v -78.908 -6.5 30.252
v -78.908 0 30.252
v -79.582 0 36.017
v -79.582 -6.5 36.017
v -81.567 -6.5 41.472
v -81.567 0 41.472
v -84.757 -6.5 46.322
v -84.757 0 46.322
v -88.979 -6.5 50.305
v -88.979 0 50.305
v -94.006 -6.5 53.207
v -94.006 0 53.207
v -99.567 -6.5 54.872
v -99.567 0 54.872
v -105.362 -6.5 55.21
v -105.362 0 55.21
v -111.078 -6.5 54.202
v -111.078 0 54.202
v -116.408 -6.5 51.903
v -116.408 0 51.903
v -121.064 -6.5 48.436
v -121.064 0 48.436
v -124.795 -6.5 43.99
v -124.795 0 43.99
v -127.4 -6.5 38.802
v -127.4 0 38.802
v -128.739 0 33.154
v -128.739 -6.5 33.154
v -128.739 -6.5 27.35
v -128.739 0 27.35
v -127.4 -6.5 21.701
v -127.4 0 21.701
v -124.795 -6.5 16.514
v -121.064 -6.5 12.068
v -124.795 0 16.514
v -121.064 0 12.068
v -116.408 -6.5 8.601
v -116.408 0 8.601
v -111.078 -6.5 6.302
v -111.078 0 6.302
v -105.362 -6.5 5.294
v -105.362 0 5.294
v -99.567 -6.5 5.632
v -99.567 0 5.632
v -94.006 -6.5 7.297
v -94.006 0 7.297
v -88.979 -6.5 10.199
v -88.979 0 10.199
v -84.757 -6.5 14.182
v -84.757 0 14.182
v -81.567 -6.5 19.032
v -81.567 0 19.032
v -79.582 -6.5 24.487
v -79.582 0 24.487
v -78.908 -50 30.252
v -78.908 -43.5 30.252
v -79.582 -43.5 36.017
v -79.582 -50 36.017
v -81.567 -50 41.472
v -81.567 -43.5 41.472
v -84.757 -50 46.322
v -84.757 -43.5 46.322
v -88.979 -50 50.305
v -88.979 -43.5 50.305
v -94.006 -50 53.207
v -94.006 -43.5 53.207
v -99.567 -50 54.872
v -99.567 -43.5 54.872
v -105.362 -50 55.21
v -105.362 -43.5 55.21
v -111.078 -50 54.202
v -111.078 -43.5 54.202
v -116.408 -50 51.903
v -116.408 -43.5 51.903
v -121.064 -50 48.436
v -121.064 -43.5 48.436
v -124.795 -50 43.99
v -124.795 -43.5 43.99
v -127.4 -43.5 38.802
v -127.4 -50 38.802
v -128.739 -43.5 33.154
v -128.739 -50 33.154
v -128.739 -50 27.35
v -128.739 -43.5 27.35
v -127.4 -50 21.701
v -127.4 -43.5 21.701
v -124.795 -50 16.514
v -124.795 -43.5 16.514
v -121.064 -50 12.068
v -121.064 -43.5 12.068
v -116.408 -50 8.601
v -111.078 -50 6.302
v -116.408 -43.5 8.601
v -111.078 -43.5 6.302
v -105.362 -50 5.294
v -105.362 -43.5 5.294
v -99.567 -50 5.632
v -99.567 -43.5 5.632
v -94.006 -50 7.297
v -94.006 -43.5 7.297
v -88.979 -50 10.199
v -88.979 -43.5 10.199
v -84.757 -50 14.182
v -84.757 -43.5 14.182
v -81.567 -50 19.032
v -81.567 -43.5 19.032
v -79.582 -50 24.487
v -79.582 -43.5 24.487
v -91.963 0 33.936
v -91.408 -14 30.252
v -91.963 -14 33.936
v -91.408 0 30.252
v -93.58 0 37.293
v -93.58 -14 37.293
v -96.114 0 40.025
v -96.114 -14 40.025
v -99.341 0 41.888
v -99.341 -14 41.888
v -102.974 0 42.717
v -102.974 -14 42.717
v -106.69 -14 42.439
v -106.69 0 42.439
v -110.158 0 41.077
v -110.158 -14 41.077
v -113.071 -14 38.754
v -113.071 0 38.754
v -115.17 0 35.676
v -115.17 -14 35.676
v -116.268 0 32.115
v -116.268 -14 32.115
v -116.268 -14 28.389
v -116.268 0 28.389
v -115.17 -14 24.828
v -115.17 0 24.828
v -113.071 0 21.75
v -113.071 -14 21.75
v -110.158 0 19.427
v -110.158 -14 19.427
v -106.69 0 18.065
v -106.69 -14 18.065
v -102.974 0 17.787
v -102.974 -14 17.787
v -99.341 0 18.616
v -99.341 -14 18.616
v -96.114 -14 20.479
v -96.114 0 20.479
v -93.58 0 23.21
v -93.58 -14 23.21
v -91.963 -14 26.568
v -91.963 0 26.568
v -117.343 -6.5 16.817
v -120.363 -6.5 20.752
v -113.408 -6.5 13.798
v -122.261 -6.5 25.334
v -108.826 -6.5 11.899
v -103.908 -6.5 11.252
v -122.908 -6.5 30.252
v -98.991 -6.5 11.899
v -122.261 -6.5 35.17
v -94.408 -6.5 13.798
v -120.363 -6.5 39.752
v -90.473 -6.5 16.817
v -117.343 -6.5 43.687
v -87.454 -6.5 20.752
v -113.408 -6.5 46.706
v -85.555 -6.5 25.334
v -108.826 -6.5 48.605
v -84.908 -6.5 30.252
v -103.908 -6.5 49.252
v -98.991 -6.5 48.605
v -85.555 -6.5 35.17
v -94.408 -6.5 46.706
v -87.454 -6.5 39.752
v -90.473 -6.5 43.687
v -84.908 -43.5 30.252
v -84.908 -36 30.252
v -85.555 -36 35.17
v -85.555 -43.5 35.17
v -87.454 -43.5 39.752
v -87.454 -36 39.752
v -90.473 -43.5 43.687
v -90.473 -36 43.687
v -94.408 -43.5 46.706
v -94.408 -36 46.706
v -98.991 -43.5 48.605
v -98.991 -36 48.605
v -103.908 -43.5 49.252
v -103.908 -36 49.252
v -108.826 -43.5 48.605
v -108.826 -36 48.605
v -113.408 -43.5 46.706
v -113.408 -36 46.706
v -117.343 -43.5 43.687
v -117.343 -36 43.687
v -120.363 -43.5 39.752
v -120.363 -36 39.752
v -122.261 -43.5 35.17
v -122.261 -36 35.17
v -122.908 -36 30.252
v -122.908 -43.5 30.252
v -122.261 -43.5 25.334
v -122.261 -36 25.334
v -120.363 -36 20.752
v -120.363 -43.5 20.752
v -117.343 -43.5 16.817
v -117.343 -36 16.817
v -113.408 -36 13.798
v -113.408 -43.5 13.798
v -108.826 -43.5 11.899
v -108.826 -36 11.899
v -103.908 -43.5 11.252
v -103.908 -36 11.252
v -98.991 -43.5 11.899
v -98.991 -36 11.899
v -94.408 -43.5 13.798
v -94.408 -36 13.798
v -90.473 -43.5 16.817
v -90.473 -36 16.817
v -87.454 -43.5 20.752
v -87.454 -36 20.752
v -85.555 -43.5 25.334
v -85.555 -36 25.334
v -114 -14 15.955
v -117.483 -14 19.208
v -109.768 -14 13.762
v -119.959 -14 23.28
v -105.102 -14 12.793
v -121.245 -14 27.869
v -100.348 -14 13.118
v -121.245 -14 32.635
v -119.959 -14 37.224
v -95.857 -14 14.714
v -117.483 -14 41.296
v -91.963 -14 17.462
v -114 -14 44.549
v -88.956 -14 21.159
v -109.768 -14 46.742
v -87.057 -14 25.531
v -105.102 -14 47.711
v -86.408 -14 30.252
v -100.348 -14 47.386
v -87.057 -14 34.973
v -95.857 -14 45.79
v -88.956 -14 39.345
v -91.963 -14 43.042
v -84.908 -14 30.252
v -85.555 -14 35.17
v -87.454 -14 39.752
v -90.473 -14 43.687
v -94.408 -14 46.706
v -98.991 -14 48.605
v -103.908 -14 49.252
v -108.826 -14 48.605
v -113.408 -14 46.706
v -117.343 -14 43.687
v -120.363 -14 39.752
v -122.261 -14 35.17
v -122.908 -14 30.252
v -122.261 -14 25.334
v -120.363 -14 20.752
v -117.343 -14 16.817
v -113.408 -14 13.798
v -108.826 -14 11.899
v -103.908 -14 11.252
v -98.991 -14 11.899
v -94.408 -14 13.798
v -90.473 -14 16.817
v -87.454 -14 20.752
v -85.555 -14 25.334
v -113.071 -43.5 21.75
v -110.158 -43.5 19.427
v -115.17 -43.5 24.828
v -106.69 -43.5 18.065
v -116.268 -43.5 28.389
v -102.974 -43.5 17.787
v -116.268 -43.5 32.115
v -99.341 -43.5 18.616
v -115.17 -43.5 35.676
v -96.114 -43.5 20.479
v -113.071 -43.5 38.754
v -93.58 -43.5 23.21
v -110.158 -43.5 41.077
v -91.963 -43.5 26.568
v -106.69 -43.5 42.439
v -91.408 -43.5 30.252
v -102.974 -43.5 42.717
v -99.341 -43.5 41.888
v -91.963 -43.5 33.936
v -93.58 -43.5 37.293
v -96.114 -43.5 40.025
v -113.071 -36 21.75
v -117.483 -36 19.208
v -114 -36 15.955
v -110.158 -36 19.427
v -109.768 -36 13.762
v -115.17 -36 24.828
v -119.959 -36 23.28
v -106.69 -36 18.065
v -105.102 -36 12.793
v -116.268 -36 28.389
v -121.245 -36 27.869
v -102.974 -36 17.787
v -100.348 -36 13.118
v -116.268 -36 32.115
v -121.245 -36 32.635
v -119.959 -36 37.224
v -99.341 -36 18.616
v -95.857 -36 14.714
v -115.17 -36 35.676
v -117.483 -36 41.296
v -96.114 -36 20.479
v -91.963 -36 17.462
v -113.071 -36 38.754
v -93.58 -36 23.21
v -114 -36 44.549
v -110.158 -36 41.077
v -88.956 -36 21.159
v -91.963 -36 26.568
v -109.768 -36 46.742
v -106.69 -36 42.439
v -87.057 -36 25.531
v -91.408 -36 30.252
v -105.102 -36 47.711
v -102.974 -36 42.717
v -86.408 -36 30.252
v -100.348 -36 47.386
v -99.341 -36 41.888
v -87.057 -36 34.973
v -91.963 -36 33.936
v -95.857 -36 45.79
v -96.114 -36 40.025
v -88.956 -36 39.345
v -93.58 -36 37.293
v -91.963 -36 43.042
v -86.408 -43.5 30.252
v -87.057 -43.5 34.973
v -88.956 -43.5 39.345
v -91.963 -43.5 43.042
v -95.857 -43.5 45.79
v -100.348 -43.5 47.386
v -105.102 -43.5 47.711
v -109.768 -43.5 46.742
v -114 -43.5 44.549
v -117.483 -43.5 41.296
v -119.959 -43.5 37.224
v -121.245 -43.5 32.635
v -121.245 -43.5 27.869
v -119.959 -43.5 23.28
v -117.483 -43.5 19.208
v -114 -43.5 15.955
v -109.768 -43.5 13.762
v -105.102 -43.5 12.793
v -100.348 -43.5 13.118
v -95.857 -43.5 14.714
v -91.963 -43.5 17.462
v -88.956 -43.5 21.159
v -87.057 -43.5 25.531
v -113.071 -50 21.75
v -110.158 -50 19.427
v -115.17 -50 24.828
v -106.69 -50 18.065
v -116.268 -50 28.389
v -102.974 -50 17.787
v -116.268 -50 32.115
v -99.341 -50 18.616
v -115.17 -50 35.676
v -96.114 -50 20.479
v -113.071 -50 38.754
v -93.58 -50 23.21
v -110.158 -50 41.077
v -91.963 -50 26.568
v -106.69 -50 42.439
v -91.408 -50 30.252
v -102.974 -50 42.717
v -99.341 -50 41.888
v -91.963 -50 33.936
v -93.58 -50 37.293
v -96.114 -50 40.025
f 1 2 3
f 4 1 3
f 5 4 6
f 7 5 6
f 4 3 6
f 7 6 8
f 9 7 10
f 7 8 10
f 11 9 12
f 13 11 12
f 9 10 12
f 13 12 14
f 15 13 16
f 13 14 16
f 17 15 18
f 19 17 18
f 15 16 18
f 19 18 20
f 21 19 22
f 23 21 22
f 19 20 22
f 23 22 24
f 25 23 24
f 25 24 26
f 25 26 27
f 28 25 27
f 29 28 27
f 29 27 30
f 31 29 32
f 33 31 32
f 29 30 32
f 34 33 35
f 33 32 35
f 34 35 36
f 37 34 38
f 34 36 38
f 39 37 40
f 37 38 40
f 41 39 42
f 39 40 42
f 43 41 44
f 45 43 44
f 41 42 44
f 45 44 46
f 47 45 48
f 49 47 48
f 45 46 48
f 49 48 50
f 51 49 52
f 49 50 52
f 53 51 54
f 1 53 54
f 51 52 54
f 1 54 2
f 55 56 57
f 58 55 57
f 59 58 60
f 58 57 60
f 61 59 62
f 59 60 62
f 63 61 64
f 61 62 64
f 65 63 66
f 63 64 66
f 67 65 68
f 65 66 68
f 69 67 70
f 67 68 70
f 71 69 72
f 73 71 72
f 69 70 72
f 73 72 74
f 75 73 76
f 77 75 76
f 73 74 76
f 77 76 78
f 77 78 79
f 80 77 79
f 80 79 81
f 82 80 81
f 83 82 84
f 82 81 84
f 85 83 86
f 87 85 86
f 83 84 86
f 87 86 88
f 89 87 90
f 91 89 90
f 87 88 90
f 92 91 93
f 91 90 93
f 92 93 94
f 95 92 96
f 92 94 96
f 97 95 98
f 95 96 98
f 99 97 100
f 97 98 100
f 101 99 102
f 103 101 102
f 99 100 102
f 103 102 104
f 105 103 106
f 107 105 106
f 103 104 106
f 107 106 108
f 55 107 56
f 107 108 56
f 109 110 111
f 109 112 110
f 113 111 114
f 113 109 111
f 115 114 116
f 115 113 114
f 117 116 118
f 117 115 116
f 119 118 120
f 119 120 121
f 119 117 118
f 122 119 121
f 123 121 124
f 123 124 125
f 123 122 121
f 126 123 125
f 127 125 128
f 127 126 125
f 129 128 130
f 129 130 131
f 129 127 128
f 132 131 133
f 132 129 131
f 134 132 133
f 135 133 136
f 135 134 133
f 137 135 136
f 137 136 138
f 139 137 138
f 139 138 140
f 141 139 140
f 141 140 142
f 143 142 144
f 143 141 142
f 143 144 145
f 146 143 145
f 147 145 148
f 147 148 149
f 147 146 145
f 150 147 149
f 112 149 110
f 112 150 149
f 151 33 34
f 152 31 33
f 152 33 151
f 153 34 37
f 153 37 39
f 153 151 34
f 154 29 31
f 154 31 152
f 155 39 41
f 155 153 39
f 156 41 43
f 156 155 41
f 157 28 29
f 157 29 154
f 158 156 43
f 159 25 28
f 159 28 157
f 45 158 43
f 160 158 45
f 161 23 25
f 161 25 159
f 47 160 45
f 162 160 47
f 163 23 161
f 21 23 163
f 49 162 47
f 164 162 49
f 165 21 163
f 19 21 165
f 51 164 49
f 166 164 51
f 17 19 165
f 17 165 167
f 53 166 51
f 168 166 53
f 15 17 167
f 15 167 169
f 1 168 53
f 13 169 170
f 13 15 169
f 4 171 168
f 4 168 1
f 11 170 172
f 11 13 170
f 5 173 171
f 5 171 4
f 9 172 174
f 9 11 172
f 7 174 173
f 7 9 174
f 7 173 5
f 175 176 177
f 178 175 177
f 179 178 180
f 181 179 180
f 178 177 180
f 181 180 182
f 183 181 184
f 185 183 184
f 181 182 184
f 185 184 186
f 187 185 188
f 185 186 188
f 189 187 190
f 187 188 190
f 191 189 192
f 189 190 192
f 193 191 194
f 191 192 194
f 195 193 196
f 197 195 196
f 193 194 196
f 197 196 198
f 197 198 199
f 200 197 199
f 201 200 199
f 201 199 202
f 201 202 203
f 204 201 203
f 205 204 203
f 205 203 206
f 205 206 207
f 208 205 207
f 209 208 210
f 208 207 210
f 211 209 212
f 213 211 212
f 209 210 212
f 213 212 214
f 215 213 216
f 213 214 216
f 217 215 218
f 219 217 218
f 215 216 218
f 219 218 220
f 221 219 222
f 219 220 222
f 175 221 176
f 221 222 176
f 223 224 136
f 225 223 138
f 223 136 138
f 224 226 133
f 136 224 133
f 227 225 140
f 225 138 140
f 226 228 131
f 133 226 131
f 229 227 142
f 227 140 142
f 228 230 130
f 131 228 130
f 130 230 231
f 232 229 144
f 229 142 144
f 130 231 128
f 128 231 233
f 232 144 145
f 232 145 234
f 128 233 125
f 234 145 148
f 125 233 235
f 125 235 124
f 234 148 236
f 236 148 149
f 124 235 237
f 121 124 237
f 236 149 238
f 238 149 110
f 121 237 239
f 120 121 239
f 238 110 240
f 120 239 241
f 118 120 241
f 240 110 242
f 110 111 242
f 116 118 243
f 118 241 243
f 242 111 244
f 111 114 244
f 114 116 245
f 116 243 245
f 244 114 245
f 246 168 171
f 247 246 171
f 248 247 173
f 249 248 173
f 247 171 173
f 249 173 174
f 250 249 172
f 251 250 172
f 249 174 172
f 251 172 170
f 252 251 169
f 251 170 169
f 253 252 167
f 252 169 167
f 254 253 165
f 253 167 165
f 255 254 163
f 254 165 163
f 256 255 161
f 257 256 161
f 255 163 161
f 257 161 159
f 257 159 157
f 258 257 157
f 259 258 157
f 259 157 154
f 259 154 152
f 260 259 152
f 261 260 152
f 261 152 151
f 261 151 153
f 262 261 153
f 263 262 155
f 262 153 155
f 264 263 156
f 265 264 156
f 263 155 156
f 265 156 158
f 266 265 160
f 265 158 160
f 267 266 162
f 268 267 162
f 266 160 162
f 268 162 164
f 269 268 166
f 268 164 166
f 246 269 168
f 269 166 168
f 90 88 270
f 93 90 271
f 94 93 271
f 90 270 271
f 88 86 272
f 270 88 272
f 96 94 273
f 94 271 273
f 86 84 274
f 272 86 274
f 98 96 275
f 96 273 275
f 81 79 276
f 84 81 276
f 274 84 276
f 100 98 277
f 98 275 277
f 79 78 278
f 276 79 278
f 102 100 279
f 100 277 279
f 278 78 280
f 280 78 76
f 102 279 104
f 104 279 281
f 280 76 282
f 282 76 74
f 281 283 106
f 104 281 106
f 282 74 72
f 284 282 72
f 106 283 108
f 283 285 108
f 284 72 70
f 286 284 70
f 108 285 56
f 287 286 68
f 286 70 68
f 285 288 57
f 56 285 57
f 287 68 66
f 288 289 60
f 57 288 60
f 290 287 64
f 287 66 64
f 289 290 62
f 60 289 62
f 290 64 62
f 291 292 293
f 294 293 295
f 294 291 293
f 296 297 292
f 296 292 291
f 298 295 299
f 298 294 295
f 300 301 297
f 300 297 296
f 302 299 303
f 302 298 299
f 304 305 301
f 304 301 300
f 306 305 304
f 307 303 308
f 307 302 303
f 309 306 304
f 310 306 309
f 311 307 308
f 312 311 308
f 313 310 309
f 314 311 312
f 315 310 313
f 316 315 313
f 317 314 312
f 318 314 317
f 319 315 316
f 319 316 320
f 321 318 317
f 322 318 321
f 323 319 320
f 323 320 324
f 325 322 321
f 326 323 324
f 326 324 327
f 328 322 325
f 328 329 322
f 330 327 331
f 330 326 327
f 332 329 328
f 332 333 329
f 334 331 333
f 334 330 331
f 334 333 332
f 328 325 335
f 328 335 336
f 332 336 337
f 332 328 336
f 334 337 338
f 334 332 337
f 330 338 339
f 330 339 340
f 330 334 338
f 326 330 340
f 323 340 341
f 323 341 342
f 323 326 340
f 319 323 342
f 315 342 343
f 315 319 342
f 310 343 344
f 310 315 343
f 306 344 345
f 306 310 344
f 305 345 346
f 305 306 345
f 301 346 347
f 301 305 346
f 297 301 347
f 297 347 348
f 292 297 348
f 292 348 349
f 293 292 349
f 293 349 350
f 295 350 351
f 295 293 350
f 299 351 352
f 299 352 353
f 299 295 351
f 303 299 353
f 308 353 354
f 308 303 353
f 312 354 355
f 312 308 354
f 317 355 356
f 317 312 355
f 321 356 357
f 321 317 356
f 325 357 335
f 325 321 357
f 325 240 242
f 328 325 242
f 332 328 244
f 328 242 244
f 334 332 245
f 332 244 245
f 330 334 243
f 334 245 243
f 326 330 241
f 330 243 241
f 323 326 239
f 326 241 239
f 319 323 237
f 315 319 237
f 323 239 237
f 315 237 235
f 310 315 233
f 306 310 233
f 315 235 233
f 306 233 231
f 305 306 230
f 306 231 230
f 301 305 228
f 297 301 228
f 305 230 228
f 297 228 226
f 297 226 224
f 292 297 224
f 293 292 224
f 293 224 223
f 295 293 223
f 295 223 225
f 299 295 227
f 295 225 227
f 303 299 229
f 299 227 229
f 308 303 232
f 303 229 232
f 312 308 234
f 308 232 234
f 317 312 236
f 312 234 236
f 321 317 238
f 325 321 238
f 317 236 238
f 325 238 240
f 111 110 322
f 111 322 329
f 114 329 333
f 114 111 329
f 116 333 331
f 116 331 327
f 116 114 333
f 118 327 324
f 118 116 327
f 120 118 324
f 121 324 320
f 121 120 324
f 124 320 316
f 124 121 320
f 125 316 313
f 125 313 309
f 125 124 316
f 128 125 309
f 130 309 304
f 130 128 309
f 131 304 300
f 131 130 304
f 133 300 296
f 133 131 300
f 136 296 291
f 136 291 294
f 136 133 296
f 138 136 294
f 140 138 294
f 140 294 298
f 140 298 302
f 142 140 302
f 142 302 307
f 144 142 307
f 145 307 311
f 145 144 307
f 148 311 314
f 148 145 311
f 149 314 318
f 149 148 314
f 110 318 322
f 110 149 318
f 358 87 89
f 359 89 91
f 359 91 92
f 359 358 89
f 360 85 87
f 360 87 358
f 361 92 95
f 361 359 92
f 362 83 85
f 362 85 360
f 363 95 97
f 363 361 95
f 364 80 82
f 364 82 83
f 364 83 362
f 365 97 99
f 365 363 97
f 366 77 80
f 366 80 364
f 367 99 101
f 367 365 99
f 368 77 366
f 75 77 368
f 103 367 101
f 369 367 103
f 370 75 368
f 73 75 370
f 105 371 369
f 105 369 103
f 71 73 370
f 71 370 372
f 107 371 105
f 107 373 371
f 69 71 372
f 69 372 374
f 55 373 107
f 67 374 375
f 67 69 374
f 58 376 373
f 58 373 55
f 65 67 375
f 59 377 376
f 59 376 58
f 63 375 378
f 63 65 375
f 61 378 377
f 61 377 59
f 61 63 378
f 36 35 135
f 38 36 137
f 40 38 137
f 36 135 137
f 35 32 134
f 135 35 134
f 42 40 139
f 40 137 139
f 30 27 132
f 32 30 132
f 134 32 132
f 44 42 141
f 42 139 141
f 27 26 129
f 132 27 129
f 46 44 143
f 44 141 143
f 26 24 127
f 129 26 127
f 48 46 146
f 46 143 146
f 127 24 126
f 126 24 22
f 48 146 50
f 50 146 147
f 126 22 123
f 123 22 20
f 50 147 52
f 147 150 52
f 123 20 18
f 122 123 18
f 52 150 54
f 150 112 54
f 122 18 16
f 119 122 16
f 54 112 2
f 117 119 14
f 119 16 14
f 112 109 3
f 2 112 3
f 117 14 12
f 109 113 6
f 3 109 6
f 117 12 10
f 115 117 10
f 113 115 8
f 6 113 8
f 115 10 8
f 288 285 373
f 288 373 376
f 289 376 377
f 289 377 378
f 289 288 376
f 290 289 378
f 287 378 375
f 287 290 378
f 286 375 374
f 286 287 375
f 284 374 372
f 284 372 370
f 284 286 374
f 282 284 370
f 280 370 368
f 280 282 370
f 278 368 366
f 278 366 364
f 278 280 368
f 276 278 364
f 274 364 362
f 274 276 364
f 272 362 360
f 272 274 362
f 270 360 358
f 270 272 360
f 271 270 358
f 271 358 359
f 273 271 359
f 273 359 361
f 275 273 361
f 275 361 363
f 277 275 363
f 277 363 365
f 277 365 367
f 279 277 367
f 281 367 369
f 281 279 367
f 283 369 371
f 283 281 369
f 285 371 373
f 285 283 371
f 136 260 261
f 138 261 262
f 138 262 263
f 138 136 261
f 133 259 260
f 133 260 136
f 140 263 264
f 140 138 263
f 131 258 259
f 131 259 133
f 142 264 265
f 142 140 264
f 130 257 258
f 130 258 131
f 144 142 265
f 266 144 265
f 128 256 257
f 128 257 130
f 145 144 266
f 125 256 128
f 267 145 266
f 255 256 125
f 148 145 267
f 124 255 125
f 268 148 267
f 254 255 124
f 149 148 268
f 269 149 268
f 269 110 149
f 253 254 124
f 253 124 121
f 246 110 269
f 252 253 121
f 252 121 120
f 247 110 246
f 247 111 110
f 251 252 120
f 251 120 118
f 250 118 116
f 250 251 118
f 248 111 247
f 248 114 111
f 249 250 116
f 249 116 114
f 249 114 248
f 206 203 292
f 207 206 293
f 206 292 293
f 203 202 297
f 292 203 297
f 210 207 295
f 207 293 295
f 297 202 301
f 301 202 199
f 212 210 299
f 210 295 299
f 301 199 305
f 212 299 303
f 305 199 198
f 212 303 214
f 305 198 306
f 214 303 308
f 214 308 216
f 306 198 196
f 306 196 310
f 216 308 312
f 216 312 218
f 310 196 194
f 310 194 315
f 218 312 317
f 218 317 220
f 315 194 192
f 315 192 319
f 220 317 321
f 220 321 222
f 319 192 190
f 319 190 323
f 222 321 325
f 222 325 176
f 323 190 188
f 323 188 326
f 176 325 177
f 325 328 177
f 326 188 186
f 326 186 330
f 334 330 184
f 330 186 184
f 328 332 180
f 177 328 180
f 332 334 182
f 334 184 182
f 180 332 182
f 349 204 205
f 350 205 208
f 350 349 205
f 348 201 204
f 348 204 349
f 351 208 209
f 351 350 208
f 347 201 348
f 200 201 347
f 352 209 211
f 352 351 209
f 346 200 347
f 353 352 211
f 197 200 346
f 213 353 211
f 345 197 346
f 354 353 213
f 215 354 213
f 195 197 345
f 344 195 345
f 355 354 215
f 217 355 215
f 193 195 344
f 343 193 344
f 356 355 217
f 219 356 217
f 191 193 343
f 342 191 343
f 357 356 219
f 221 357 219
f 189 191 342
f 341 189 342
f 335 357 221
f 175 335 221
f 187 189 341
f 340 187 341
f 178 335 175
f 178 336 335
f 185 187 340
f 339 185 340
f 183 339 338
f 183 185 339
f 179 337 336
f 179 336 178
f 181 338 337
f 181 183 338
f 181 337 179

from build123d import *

# Parameters (mm, degrees)
F0_R     = 25
F0_R_2   = 12.5
F1_DEPTH = 6.5
F2_R     = 19
F2_R_2   = 12.5
F3_DEPTH = 7.5
F4_R     = 17.5
F4_R_2   = 12.5
F5_DEPTH = 22
F6_R     = 19
F6_R_2   = 17.5
F7_DEPTH = 7.5
F8_R     = 25
F8_R_2   = 19
F8_R_3   = 17.5
F8_R_4   = 12.5
F9_DEPTH = 6.5


with BuildPart() as f1:
    # F0 (on Front) → F1 (new body)
    with BuildSketch(Plane.XZ):
        with Locations((-103.9080694318, 30.2519872785)):
            Circle(F0_R)
        with Locations((-103.9080694318, 30.2519872785)):
            Circle(F0_R_2, mode=Mode.SUBTRACT)
    extrude(amount=F1_DEPTH)

    # F2 (on face) → F3 (join)
    with BuildSketch(Plane.XZ.offset(6.5)):
        with Locations((-103.9080694318, 30.2519872785)):
            Circle(F2_R)
        with Locations((-103.9080694318, 30.2519872785)):
            Circle(F2_R_2, mode=Mode.SUBTRACT)
    extrude(amount=F3_DEPTH)


with BuildPart() as f5:
    # F4 (on face) → F5 (new body)
    with BuildSketch(Plane.XZ.offset(14)):
        with Locations((-103.9080694318, 30.2519872785)):
            Circle(F4_R)
        with Locations((-103.9080694318, 30.2519872785)):
            Circle(F4_R_2, mode=Mode.SUBTRACT)
    extrude(amount=F5_DEPTH)


with BuildPart() as f7:
    # F6 (on face) → F7 (new body)
    with BuildSketch(Plane.XZ.offset(36)):
        with Locations((-103.9080694318, 30.2519872785)):
            Circle(F6_R)
        with Locations((-103.9080694318, 30.2519872785)):
            Circle(F6_R_2, mode=Mode.SUBTRACT)
    extrude(amount=F7_DEPTH)


with BuildPart() as f9:
    # F8 (on face) → F9 (new body)
    with BuildSketch(Plane.XZ.offset(43.5)):
        with Locations((-103.9080694318, 30.2519872785)):
            Circle(F8_R)
        with Locations((-103.9080694318, 30.2519872785)):
            Circle(F8_R_2, mode=Mode.SUBTRACT)
        with Locations((-103.9080694318, 30.2519872785)):
            Circle(F8_R_2)
        with Locations((-103.9080694318, 30.2519872785)):
            Circle(F8_R_3, mode=Mode.SUBTRACT)
        with Locations((-103.9080694318, 30.2519872785)):
            Circle(F8_R_3)
        with Locations((-103.9080694318, 30.2519872785)):
            Circle(F8_R_4, mode=Mode.SUBTRACT)
    extrude(amount=F9_DEPTH)


solid = Compound([f1.part, f5.part, f7.part, f9.part])
